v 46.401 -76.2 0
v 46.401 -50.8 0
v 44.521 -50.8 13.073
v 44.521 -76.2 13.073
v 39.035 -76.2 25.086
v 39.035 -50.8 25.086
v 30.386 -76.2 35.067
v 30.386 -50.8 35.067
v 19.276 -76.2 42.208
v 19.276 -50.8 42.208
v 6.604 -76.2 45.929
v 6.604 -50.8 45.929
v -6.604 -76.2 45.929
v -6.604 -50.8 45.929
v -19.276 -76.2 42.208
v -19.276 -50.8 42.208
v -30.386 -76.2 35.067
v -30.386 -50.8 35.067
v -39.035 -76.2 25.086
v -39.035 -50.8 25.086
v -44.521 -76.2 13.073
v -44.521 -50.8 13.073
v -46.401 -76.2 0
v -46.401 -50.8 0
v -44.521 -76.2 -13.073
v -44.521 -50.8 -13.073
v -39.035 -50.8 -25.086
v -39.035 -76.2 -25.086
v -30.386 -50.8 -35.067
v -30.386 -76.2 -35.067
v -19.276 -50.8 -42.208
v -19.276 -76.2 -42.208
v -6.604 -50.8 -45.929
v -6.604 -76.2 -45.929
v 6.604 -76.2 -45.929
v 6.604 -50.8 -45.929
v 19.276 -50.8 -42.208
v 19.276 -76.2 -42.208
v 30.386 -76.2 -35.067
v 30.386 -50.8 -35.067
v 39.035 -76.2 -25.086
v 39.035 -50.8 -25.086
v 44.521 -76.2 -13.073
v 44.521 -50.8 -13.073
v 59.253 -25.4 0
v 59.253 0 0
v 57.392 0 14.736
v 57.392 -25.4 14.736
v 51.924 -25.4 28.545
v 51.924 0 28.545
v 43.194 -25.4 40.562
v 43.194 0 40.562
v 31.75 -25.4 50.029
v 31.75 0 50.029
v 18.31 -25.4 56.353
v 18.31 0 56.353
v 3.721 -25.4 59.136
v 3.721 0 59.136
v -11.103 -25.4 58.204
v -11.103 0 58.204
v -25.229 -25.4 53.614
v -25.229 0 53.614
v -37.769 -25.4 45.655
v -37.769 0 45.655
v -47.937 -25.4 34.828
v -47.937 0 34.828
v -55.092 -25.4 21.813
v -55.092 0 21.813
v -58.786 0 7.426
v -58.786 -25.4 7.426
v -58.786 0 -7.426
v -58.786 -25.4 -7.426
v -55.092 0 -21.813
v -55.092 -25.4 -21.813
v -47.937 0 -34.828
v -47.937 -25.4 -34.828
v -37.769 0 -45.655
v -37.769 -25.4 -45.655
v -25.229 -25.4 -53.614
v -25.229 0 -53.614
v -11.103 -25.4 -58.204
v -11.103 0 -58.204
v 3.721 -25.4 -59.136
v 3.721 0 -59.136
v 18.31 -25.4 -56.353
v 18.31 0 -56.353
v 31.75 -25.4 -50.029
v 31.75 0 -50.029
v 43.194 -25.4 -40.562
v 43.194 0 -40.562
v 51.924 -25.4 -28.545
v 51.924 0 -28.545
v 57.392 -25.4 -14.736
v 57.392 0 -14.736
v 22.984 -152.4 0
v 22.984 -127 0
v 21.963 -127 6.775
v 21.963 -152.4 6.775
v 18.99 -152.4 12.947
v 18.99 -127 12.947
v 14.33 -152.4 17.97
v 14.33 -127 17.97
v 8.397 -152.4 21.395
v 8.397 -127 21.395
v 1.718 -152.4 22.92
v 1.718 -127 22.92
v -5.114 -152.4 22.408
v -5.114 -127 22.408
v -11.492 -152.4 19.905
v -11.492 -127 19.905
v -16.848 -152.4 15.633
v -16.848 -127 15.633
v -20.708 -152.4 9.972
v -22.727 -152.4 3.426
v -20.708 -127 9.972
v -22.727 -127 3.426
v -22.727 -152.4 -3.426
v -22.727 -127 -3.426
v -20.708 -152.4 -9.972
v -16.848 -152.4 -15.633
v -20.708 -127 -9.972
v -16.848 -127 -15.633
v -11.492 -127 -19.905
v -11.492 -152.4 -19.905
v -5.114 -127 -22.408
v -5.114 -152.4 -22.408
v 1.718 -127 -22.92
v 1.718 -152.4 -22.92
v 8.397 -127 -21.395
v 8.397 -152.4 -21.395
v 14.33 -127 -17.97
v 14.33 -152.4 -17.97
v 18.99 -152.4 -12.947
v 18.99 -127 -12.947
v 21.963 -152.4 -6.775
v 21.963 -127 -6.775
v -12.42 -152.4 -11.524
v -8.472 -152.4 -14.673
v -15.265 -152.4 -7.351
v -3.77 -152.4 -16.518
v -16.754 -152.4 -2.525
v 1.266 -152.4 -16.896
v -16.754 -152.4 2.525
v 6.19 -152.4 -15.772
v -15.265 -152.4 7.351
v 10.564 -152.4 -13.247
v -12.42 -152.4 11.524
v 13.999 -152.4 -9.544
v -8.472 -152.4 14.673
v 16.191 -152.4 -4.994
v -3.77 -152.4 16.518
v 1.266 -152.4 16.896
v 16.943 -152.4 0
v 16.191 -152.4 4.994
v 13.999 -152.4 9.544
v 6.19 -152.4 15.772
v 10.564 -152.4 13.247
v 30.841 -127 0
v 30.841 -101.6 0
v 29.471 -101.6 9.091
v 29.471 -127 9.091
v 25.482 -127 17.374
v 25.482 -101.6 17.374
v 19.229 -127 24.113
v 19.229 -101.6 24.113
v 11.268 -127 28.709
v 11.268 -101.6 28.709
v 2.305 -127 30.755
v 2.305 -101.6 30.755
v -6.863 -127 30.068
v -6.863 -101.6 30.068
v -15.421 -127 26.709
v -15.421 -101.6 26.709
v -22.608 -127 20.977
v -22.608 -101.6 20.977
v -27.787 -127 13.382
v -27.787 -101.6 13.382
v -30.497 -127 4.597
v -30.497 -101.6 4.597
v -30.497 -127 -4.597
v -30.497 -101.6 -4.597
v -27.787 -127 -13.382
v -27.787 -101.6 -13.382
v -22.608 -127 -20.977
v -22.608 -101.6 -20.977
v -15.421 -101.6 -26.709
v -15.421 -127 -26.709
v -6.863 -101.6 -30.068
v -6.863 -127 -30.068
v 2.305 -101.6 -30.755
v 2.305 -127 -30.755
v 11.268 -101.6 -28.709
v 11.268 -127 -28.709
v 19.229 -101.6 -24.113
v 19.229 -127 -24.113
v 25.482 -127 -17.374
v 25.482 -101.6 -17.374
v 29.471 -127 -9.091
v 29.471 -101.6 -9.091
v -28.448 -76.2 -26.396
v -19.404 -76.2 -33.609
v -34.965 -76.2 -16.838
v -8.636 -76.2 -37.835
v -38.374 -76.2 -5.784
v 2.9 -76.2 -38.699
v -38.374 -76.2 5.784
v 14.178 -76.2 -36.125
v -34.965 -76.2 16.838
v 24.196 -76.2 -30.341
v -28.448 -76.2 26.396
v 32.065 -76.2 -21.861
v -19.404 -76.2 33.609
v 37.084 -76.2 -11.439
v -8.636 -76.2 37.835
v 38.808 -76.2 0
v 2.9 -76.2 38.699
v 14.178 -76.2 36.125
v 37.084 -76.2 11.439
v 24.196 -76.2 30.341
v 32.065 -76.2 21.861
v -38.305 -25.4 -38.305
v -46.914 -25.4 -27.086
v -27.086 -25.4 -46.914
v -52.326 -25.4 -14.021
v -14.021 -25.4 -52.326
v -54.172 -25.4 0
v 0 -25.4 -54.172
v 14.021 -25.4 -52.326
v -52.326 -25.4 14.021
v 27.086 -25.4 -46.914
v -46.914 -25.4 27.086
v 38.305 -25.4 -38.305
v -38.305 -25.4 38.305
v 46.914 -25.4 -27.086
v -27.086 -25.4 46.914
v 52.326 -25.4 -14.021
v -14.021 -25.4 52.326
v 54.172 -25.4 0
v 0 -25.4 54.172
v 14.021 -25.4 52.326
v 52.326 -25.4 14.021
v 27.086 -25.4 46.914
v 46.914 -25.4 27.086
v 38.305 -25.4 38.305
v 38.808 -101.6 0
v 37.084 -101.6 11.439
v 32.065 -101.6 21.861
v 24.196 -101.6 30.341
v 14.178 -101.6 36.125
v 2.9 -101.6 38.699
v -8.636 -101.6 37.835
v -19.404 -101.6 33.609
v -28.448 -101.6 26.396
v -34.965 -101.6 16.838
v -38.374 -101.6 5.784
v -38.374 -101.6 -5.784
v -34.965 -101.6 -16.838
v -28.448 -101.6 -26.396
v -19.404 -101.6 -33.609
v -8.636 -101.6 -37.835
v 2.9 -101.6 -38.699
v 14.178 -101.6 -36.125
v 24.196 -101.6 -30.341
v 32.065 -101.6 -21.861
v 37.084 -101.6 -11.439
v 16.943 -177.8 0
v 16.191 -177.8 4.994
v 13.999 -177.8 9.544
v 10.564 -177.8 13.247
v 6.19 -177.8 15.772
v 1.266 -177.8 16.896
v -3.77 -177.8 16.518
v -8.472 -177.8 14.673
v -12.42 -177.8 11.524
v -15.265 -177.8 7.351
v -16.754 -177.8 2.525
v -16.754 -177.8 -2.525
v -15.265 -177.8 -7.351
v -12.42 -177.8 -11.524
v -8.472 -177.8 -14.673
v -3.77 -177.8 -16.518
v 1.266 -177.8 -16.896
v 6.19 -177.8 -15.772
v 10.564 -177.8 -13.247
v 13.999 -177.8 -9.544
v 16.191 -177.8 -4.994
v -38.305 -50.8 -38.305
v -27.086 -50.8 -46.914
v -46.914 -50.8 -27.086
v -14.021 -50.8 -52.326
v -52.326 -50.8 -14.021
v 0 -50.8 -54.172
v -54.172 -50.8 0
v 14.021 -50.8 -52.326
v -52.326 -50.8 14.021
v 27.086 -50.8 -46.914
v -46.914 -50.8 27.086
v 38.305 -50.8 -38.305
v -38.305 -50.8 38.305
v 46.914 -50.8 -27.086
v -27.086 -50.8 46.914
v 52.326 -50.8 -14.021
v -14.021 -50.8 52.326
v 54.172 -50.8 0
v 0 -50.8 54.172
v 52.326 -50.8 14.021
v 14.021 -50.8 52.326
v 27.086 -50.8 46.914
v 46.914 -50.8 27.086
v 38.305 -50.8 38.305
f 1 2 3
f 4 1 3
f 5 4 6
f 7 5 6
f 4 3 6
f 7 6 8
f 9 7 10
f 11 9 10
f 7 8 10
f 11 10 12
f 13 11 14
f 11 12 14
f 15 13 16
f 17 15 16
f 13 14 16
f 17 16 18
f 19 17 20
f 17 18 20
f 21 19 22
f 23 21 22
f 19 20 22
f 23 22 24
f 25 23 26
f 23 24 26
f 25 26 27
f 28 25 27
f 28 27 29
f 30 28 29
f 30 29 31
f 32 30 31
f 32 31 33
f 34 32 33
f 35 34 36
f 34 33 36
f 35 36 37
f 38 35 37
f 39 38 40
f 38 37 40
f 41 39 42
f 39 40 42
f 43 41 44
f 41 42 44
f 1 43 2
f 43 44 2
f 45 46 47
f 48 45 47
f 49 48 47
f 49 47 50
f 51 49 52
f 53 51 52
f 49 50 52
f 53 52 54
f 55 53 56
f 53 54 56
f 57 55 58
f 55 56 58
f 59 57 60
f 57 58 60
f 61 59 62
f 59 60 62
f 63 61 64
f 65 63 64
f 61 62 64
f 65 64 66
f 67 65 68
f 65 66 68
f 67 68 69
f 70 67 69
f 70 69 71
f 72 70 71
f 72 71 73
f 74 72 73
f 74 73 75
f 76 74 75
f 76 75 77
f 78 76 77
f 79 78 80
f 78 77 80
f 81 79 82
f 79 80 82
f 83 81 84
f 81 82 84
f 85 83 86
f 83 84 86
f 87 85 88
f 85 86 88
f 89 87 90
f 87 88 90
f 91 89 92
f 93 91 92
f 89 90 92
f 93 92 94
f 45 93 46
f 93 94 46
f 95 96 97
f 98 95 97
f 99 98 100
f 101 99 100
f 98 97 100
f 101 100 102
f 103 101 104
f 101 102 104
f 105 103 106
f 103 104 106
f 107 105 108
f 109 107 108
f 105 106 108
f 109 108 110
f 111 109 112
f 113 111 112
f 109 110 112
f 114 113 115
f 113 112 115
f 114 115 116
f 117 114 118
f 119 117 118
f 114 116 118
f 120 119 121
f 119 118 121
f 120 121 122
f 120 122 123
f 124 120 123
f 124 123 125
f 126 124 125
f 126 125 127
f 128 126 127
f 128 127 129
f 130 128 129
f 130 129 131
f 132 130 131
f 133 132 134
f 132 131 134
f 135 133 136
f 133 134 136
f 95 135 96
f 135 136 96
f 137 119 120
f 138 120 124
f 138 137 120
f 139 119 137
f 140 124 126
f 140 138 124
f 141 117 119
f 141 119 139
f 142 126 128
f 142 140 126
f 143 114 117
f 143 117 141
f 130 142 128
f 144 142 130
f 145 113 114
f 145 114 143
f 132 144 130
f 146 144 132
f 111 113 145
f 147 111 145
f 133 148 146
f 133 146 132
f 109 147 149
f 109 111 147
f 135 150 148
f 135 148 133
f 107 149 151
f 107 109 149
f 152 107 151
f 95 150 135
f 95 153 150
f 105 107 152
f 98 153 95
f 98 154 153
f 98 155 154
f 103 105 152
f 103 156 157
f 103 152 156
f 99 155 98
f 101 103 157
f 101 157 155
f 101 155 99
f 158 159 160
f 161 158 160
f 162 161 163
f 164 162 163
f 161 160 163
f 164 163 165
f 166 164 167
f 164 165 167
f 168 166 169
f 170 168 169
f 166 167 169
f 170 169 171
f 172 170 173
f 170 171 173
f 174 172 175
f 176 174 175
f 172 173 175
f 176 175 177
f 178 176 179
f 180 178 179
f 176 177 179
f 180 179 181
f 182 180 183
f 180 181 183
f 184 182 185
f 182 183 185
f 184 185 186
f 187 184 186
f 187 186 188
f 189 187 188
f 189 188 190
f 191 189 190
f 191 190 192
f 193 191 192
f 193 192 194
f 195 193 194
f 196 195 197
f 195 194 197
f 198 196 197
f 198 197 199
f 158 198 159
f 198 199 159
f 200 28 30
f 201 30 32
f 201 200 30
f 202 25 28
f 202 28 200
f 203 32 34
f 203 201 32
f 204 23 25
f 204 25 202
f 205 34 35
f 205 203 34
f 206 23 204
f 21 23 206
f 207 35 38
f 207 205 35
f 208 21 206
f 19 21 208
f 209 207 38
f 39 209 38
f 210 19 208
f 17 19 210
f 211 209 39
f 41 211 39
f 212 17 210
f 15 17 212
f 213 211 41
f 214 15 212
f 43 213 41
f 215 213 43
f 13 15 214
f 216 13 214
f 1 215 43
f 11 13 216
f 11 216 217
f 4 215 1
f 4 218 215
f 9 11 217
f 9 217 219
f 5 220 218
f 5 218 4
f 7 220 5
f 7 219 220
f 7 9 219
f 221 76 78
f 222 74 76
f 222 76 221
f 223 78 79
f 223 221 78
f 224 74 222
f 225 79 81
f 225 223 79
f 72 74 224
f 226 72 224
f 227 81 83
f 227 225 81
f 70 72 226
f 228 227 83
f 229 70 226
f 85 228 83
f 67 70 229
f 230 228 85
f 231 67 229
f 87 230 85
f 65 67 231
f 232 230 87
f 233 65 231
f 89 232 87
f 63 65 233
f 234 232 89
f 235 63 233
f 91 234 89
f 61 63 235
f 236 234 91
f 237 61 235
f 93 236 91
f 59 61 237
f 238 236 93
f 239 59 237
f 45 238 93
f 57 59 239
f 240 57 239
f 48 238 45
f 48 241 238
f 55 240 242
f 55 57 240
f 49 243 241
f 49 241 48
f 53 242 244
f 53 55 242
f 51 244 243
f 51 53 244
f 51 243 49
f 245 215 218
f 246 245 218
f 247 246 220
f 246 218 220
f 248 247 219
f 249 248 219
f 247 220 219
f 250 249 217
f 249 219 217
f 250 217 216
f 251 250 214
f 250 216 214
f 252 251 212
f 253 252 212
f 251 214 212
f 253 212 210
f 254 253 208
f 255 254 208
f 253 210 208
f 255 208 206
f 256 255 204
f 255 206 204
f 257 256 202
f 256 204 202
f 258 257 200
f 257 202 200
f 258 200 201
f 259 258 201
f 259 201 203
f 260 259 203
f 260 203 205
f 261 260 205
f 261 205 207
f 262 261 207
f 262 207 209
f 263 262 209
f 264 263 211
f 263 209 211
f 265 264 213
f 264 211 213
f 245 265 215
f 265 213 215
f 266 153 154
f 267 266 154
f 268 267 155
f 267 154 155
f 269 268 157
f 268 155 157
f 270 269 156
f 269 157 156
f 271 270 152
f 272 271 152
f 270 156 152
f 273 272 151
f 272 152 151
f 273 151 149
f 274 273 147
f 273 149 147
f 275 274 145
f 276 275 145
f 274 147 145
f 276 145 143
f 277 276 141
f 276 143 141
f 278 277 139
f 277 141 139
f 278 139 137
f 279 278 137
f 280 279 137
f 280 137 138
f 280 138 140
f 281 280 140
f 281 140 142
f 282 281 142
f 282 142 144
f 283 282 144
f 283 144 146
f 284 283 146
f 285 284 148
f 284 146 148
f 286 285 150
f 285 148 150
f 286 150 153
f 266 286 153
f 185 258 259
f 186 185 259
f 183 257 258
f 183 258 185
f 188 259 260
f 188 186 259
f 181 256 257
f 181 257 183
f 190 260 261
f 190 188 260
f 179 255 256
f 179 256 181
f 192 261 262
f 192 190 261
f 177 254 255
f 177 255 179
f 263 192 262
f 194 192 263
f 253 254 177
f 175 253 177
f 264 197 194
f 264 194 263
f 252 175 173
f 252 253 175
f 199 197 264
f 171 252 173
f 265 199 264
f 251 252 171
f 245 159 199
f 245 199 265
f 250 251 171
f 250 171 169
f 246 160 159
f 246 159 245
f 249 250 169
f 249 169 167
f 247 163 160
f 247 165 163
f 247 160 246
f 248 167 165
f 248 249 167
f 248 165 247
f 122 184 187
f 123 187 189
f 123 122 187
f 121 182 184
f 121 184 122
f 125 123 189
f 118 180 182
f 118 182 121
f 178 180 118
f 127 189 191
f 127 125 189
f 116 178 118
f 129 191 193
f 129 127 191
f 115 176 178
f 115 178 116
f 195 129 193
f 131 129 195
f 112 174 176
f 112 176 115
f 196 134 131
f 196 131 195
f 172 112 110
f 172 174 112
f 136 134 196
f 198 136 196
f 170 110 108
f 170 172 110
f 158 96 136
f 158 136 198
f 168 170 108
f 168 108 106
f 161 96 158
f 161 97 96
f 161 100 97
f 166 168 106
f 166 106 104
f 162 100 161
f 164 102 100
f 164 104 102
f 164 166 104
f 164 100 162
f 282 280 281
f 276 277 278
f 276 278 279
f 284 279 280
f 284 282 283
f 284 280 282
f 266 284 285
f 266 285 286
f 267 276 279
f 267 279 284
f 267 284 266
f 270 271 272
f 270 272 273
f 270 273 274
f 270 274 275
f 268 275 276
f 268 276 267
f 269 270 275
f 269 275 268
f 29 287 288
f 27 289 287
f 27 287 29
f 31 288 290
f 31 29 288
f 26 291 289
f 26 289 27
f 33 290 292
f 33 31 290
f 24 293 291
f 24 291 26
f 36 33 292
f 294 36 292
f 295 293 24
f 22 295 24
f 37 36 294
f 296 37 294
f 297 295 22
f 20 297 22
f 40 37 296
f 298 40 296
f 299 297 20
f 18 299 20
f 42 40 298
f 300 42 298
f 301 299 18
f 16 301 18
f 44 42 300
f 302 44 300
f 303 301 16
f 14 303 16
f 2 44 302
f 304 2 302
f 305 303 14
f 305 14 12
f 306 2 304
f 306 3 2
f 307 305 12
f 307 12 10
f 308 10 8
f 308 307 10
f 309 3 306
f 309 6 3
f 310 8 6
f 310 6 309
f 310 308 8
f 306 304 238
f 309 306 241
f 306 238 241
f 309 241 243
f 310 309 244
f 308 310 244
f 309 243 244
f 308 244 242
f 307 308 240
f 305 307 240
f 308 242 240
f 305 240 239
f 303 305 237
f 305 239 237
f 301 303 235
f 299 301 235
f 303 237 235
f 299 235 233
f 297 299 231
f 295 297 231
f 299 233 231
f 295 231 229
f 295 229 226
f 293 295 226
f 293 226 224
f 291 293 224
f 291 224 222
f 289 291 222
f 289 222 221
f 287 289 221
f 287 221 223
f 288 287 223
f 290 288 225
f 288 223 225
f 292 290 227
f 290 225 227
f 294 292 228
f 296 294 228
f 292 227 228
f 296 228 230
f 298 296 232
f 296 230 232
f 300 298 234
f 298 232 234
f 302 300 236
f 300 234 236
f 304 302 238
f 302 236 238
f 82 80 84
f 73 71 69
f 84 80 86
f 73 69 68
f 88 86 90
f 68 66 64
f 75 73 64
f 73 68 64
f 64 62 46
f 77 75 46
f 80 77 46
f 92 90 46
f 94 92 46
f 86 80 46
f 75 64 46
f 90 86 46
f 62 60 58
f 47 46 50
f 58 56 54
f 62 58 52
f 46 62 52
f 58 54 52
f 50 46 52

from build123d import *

# Parameters (mm, degrees)
F0_R      = 59.253304
F1_DEPTH  = 25.4
F2_R      = 54.171653
F3_DEPTH  = 25.4
F4_R      = 46.400893
F5_DEPTH  = 25.4
F6_R      = 38.807886
F7_DEPTH  = 25.4
F8_R      = 30.841297
F9_DEPTH  = 25.4
F10_R     = 22.983949
F11_DEPTH = 25.4
F12_R     = 16.943249
F13_DEPTH = 25.4


with BuildPart() as f1:
    # F0 (on Front) → F1 (new body)
    with BuildSketch(Plane.XZ):
        Circle(F0_R)
    extrude(amount=F1_DEPTH)

    # F2 (on face) → F3 (join)
    with BuildSketch(Plane.XZ.offset(25.4)):
        Circle(F2_R)
    extrude(amount=F3_DEPTH)

    # F4 (on face) → F5 (join)
    with BuildSketch(Plane.XZ.offset(50.8)):
        Circle(F4_R)
    extrude(amount=F5_DEPTH)

    # F6 (on face) → F7 (join)
    with BuildSketch(Plane.XZ.offset(76.2)):
        Circle(F6_R)
    extrude(amount=F7_DEPTH)

    # F8 (on face) → F9 (join)
    with BuildSketch(Plane.XZ.offset(101.6)):
        Circle(F8_R)
    extrude(amount=F9_DEPTH)

    # F10 (on face) → F11 (join)
    with BuildSketch(Plane.XZ.offset(127)):
        Circle(F10_R)
    extrude(amount=F11_DEPTH)

    # F12 (on face) → F13 (join)
    with BuildSketch(Plane.XZ.offset(152.4)):
        Circle(F12_R)
    extrude(amount=F13_DEPTH)


solid = f1.part
